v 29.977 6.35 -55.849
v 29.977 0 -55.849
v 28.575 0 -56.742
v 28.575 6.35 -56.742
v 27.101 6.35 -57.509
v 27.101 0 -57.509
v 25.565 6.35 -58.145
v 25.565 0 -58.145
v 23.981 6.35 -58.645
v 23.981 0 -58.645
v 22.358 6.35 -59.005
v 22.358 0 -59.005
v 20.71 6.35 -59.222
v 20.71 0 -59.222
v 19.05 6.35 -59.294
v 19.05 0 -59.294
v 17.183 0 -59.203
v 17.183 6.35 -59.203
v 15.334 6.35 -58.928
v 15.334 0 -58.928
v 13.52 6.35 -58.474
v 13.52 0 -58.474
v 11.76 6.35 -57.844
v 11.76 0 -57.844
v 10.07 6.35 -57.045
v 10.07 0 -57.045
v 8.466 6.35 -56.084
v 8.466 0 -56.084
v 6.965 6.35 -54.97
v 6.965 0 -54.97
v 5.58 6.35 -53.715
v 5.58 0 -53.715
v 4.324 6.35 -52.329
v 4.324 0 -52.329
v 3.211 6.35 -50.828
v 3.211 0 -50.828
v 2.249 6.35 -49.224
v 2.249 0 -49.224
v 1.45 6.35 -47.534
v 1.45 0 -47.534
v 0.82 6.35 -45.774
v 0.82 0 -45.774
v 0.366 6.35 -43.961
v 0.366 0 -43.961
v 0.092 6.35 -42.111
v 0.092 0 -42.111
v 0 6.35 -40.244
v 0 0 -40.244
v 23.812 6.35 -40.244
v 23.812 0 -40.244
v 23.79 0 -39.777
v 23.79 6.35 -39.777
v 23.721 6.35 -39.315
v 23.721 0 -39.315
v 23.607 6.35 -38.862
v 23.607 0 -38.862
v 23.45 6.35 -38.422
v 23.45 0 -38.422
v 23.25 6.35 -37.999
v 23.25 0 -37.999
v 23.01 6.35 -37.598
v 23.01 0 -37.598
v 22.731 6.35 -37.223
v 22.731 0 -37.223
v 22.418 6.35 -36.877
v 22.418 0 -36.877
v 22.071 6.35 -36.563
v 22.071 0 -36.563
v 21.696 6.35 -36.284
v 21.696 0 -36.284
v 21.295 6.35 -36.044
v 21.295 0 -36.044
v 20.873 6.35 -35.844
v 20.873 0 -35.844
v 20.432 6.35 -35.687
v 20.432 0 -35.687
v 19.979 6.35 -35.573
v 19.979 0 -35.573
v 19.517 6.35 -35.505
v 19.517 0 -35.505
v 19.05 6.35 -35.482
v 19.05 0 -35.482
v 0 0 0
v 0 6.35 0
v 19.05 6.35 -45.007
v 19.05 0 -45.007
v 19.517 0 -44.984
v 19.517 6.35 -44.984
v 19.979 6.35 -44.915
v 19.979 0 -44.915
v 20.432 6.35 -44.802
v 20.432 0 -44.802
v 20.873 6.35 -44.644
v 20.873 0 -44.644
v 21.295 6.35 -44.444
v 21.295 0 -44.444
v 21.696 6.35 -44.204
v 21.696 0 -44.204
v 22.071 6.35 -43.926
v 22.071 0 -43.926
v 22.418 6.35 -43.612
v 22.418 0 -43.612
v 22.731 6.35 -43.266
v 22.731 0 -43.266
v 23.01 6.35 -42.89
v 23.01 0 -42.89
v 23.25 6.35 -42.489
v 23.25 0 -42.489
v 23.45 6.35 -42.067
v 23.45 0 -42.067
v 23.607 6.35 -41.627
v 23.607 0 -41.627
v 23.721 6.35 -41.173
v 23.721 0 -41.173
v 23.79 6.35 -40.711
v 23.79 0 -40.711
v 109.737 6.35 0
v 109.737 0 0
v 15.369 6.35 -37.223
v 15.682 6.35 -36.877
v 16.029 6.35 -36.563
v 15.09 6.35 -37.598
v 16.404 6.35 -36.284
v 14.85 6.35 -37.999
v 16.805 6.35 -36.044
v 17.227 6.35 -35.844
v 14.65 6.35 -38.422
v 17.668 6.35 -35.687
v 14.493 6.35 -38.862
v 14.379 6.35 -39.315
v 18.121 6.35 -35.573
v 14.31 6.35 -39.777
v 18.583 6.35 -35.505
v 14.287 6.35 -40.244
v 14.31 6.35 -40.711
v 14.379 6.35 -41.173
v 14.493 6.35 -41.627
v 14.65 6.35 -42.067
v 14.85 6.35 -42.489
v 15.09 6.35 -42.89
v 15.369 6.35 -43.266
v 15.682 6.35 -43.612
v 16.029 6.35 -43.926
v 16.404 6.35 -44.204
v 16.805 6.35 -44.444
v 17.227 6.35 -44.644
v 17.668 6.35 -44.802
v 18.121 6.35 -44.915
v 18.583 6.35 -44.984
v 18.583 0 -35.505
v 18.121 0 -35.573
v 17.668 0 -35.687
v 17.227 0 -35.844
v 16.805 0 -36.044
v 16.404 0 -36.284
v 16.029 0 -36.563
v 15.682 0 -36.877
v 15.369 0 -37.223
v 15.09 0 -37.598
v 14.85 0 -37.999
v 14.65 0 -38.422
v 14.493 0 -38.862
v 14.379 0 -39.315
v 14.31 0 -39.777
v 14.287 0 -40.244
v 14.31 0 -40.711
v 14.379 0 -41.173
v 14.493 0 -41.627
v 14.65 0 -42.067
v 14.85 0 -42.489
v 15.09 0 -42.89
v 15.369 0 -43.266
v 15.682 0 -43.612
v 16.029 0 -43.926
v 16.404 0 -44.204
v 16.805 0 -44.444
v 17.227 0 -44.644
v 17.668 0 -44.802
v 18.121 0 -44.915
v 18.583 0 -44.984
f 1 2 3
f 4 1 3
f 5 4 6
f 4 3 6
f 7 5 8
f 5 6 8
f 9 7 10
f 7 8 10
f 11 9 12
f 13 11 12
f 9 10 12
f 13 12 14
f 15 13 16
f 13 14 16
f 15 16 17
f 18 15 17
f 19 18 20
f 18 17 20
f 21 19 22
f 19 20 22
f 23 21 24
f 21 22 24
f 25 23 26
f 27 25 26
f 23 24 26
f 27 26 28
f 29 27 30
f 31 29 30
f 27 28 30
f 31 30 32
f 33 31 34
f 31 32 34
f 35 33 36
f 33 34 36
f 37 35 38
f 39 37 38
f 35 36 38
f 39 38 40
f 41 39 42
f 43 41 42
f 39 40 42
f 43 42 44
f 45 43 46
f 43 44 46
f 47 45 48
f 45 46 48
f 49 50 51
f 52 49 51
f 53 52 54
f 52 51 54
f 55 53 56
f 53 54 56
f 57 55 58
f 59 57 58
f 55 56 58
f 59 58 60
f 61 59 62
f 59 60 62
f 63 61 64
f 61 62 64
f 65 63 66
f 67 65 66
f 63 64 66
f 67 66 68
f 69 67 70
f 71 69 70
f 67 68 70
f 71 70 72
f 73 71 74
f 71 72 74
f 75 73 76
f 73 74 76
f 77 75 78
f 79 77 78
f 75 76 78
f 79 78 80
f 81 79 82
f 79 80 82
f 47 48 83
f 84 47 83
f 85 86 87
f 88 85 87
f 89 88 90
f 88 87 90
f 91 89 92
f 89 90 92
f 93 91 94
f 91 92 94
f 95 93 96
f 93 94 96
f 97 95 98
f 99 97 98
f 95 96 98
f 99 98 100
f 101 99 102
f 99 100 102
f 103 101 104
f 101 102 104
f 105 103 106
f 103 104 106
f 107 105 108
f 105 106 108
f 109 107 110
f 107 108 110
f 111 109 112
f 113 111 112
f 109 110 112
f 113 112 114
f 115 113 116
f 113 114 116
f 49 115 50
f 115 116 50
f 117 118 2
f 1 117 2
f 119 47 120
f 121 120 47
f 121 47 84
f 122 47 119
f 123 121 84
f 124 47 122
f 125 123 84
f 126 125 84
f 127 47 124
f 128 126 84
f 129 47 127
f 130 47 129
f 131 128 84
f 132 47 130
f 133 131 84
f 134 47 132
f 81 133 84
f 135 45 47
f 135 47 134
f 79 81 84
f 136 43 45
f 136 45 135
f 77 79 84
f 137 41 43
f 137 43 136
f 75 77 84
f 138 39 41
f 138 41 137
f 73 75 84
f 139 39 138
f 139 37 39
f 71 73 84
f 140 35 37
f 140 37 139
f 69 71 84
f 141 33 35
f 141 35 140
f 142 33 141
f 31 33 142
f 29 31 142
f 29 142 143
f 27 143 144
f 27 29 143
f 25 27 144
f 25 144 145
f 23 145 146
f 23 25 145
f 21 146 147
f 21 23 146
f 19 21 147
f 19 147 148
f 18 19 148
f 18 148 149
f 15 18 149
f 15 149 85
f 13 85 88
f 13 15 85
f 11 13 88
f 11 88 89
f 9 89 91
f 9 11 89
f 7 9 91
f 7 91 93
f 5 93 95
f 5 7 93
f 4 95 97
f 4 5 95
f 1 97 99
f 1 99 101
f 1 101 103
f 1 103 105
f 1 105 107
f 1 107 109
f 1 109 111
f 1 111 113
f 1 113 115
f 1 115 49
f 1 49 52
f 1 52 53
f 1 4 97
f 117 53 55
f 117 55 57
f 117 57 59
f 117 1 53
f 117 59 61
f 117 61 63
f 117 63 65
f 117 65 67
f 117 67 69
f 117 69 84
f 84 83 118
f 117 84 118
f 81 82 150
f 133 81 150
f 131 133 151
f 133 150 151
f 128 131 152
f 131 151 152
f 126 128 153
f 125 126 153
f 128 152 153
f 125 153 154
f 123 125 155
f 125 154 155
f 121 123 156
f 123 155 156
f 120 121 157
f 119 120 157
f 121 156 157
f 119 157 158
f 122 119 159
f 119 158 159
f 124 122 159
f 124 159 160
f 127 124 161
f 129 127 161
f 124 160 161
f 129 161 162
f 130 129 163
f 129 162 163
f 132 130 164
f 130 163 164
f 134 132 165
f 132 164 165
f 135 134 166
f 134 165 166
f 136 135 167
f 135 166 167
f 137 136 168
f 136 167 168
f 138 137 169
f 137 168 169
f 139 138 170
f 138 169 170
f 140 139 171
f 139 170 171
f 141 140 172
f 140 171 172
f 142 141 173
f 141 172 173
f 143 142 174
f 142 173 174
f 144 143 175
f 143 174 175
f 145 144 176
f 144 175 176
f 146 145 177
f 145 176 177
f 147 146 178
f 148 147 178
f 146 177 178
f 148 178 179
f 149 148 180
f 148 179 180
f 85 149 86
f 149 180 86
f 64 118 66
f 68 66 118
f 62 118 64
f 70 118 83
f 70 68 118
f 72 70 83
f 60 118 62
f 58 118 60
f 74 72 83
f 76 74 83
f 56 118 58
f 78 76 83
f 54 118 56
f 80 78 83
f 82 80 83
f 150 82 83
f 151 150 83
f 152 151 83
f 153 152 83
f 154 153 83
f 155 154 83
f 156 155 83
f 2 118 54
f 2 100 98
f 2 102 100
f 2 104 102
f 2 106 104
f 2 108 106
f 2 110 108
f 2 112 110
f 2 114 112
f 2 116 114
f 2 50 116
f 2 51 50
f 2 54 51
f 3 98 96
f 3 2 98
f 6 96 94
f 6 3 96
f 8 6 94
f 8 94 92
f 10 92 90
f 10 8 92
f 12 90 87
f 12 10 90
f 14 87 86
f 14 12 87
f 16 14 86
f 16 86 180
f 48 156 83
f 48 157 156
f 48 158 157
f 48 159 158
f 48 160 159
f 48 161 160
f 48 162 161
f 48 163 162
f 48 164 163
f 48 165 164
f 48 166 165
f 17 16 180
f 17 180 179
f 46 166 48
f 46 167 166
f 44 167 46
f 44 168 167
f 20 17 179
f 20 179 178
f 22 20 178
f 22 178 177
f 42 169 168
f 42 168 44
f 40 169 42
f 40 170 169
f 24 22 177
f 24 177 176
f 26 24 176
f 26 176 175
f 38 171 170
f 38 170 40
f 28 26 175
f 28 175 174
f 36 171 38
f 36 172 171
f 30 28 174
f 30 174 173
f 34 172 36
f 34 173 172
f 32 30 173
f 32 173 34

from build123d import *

# Parameters (mm, degrees)
BOSS_EXTRUDE2_DEPTH = 6.35


with BuildPart() as part:
    # Sketch1 → Boss-Extrude2 (new body)
    # profile 1 of 5: a face of its own
    with BuildSketch(Plane(origin=(0, 0, 0), x_dir=(1, 0, 0), z_dir=(0, 1, 0))):
        with BuildLine():
            Line((19.05, 45.006744084), (19.05, 59.294244084))
            ThreePointArc((19.05, 59.294244084), (5.579615818, 53.714628266), (0, 40.244244084))
            Line((0, 40.244244084), (0, 0))
            Line((0, 0), (19.05, 0))
            Line((19.05, 0), (19.05, 8.89))
            Line((19.05, 8.89), (8.89, 8.89))
            Line((8.89, 8.89), (8.89, 24.129750608))
            ThreePointArc((8.89, 24.129750608), (13.762212217, 21.942828828), (19.05, 21.194244084))
            Line((19.05, 21.194244084), (19.05, 35.481744084))
            ThreePointArc((19.05, 35.481744084), (14.2875, 40.244244084), (19.05, 45.006744084))
        make_face()
    # profile 2 of 5: a face of its own
    with BuildSketch(Plane(origin=(0, 0, 0), x_dir=(1, 0, 0), z_dir=(0, 1, 0))):
        with BuildLine():
            ThreePointArc((29.976631112, 55.849090528), (24.778445481, 58.412551996), (19.05, 59.294244084))
            Line((19.05, 59.294244084), (19.05, 45.006744084))
            ThreePointArc((19.05, 45.006744084), (22.417596045, 43.611840129), (23.8125, 40.244244084))
            ThreePointArc((23.8125, 40.244244084), (22.417596045, 36.876648039), (19.05, 35.481744084))
            Line((19.05, 35.481744084), (19.05, 21.194244084))
            ThreePointArc((19.05, 21.194244084), (22.242798897, 21.463708011), (25.345272951, 22.264476608))
            Line((25.345272951, 22.264476608), (34.29, 8.89))
            Line((34.29, 8.89), (19.05, 8.89))
            Line((19.05, 8.89), (19.05, 0))
            Line((19.05, 0), (109.737398428, 0))
            Line((109.737398428, 0), (29.976631112, 55.849090528))
        make_face()
        with BuildLine():
            Line((46.99, 8.89), (33.57249636, 27.915432321))
            ThreePointArc((33.57249636, 27.915432321), (35.515172131, 30.66298077), (36.94411395, 33.709476611))
            Line((36.94411395, 33.709476611), (72.39, 8.89))
            Line((72.39, 8.89), (46.99, 8.89))
        make_face(mode=Mode.SUBTRACT)
    # profile 3 of 5: a face of its own
    with BuildSketch(Plane(origin=(0, 0, 0), x_dir=(1, 0, 0), z_dir=(0, 1, 0))):
        with BuildLine():
            ThreePointArc((25.345272951, 22.264476608), (22.242798897, 21.463708011), (19.05, 21.194244084))
            Line((19.05, 21.194244084), (19.05, 8.89))
            Line((19.05, 8.89), (34.29, 8.89))
            Line((34.29, 8.89), (25.345272951, 22.264476608))
        make_face()
    # profile 4 of 5: a face of its own
    with BuildSketch(Plane(origin=(0, 0, 0), x_dir=(1, 0, 0), z_dir=(0, 1, 0))):
        with BuildLine():
            Line((19.05, 8.89), (19.05, 21.194244084))
            ThreePointArc((19.05, 21.194244084), (13.762212217, 21.942828828), (8.89, 24.129750608))
            Line((8.89, 24.129750608), (8.89, 8.89))
            Line((8.89, 8.89), (19.05, 8.89))
        make_face()
    # profile 5 of 5: a face of its own
    with BuildSketch(Plane(origin=(0, 0, 0), x_dir=(1, 0, 0), z_dir=(0, 1, 0))):
        with BuildLine():
            ThreePointArc((33.57249636, 27.915432321), (35.515172131, 30.66298077), (36.94411395, 33.709476611))
            Line((36.94411395, 33.709476611), (72.39, 8.89))
            Line((72.39, 8.89), (46.99, 8.89))
            Line((46.99, 8.89), (33.57249636, 27.915432321))
        make_face()
    extrude(amount=BOSS_EXTRUDE2_DEPTH)


solid = part.part
